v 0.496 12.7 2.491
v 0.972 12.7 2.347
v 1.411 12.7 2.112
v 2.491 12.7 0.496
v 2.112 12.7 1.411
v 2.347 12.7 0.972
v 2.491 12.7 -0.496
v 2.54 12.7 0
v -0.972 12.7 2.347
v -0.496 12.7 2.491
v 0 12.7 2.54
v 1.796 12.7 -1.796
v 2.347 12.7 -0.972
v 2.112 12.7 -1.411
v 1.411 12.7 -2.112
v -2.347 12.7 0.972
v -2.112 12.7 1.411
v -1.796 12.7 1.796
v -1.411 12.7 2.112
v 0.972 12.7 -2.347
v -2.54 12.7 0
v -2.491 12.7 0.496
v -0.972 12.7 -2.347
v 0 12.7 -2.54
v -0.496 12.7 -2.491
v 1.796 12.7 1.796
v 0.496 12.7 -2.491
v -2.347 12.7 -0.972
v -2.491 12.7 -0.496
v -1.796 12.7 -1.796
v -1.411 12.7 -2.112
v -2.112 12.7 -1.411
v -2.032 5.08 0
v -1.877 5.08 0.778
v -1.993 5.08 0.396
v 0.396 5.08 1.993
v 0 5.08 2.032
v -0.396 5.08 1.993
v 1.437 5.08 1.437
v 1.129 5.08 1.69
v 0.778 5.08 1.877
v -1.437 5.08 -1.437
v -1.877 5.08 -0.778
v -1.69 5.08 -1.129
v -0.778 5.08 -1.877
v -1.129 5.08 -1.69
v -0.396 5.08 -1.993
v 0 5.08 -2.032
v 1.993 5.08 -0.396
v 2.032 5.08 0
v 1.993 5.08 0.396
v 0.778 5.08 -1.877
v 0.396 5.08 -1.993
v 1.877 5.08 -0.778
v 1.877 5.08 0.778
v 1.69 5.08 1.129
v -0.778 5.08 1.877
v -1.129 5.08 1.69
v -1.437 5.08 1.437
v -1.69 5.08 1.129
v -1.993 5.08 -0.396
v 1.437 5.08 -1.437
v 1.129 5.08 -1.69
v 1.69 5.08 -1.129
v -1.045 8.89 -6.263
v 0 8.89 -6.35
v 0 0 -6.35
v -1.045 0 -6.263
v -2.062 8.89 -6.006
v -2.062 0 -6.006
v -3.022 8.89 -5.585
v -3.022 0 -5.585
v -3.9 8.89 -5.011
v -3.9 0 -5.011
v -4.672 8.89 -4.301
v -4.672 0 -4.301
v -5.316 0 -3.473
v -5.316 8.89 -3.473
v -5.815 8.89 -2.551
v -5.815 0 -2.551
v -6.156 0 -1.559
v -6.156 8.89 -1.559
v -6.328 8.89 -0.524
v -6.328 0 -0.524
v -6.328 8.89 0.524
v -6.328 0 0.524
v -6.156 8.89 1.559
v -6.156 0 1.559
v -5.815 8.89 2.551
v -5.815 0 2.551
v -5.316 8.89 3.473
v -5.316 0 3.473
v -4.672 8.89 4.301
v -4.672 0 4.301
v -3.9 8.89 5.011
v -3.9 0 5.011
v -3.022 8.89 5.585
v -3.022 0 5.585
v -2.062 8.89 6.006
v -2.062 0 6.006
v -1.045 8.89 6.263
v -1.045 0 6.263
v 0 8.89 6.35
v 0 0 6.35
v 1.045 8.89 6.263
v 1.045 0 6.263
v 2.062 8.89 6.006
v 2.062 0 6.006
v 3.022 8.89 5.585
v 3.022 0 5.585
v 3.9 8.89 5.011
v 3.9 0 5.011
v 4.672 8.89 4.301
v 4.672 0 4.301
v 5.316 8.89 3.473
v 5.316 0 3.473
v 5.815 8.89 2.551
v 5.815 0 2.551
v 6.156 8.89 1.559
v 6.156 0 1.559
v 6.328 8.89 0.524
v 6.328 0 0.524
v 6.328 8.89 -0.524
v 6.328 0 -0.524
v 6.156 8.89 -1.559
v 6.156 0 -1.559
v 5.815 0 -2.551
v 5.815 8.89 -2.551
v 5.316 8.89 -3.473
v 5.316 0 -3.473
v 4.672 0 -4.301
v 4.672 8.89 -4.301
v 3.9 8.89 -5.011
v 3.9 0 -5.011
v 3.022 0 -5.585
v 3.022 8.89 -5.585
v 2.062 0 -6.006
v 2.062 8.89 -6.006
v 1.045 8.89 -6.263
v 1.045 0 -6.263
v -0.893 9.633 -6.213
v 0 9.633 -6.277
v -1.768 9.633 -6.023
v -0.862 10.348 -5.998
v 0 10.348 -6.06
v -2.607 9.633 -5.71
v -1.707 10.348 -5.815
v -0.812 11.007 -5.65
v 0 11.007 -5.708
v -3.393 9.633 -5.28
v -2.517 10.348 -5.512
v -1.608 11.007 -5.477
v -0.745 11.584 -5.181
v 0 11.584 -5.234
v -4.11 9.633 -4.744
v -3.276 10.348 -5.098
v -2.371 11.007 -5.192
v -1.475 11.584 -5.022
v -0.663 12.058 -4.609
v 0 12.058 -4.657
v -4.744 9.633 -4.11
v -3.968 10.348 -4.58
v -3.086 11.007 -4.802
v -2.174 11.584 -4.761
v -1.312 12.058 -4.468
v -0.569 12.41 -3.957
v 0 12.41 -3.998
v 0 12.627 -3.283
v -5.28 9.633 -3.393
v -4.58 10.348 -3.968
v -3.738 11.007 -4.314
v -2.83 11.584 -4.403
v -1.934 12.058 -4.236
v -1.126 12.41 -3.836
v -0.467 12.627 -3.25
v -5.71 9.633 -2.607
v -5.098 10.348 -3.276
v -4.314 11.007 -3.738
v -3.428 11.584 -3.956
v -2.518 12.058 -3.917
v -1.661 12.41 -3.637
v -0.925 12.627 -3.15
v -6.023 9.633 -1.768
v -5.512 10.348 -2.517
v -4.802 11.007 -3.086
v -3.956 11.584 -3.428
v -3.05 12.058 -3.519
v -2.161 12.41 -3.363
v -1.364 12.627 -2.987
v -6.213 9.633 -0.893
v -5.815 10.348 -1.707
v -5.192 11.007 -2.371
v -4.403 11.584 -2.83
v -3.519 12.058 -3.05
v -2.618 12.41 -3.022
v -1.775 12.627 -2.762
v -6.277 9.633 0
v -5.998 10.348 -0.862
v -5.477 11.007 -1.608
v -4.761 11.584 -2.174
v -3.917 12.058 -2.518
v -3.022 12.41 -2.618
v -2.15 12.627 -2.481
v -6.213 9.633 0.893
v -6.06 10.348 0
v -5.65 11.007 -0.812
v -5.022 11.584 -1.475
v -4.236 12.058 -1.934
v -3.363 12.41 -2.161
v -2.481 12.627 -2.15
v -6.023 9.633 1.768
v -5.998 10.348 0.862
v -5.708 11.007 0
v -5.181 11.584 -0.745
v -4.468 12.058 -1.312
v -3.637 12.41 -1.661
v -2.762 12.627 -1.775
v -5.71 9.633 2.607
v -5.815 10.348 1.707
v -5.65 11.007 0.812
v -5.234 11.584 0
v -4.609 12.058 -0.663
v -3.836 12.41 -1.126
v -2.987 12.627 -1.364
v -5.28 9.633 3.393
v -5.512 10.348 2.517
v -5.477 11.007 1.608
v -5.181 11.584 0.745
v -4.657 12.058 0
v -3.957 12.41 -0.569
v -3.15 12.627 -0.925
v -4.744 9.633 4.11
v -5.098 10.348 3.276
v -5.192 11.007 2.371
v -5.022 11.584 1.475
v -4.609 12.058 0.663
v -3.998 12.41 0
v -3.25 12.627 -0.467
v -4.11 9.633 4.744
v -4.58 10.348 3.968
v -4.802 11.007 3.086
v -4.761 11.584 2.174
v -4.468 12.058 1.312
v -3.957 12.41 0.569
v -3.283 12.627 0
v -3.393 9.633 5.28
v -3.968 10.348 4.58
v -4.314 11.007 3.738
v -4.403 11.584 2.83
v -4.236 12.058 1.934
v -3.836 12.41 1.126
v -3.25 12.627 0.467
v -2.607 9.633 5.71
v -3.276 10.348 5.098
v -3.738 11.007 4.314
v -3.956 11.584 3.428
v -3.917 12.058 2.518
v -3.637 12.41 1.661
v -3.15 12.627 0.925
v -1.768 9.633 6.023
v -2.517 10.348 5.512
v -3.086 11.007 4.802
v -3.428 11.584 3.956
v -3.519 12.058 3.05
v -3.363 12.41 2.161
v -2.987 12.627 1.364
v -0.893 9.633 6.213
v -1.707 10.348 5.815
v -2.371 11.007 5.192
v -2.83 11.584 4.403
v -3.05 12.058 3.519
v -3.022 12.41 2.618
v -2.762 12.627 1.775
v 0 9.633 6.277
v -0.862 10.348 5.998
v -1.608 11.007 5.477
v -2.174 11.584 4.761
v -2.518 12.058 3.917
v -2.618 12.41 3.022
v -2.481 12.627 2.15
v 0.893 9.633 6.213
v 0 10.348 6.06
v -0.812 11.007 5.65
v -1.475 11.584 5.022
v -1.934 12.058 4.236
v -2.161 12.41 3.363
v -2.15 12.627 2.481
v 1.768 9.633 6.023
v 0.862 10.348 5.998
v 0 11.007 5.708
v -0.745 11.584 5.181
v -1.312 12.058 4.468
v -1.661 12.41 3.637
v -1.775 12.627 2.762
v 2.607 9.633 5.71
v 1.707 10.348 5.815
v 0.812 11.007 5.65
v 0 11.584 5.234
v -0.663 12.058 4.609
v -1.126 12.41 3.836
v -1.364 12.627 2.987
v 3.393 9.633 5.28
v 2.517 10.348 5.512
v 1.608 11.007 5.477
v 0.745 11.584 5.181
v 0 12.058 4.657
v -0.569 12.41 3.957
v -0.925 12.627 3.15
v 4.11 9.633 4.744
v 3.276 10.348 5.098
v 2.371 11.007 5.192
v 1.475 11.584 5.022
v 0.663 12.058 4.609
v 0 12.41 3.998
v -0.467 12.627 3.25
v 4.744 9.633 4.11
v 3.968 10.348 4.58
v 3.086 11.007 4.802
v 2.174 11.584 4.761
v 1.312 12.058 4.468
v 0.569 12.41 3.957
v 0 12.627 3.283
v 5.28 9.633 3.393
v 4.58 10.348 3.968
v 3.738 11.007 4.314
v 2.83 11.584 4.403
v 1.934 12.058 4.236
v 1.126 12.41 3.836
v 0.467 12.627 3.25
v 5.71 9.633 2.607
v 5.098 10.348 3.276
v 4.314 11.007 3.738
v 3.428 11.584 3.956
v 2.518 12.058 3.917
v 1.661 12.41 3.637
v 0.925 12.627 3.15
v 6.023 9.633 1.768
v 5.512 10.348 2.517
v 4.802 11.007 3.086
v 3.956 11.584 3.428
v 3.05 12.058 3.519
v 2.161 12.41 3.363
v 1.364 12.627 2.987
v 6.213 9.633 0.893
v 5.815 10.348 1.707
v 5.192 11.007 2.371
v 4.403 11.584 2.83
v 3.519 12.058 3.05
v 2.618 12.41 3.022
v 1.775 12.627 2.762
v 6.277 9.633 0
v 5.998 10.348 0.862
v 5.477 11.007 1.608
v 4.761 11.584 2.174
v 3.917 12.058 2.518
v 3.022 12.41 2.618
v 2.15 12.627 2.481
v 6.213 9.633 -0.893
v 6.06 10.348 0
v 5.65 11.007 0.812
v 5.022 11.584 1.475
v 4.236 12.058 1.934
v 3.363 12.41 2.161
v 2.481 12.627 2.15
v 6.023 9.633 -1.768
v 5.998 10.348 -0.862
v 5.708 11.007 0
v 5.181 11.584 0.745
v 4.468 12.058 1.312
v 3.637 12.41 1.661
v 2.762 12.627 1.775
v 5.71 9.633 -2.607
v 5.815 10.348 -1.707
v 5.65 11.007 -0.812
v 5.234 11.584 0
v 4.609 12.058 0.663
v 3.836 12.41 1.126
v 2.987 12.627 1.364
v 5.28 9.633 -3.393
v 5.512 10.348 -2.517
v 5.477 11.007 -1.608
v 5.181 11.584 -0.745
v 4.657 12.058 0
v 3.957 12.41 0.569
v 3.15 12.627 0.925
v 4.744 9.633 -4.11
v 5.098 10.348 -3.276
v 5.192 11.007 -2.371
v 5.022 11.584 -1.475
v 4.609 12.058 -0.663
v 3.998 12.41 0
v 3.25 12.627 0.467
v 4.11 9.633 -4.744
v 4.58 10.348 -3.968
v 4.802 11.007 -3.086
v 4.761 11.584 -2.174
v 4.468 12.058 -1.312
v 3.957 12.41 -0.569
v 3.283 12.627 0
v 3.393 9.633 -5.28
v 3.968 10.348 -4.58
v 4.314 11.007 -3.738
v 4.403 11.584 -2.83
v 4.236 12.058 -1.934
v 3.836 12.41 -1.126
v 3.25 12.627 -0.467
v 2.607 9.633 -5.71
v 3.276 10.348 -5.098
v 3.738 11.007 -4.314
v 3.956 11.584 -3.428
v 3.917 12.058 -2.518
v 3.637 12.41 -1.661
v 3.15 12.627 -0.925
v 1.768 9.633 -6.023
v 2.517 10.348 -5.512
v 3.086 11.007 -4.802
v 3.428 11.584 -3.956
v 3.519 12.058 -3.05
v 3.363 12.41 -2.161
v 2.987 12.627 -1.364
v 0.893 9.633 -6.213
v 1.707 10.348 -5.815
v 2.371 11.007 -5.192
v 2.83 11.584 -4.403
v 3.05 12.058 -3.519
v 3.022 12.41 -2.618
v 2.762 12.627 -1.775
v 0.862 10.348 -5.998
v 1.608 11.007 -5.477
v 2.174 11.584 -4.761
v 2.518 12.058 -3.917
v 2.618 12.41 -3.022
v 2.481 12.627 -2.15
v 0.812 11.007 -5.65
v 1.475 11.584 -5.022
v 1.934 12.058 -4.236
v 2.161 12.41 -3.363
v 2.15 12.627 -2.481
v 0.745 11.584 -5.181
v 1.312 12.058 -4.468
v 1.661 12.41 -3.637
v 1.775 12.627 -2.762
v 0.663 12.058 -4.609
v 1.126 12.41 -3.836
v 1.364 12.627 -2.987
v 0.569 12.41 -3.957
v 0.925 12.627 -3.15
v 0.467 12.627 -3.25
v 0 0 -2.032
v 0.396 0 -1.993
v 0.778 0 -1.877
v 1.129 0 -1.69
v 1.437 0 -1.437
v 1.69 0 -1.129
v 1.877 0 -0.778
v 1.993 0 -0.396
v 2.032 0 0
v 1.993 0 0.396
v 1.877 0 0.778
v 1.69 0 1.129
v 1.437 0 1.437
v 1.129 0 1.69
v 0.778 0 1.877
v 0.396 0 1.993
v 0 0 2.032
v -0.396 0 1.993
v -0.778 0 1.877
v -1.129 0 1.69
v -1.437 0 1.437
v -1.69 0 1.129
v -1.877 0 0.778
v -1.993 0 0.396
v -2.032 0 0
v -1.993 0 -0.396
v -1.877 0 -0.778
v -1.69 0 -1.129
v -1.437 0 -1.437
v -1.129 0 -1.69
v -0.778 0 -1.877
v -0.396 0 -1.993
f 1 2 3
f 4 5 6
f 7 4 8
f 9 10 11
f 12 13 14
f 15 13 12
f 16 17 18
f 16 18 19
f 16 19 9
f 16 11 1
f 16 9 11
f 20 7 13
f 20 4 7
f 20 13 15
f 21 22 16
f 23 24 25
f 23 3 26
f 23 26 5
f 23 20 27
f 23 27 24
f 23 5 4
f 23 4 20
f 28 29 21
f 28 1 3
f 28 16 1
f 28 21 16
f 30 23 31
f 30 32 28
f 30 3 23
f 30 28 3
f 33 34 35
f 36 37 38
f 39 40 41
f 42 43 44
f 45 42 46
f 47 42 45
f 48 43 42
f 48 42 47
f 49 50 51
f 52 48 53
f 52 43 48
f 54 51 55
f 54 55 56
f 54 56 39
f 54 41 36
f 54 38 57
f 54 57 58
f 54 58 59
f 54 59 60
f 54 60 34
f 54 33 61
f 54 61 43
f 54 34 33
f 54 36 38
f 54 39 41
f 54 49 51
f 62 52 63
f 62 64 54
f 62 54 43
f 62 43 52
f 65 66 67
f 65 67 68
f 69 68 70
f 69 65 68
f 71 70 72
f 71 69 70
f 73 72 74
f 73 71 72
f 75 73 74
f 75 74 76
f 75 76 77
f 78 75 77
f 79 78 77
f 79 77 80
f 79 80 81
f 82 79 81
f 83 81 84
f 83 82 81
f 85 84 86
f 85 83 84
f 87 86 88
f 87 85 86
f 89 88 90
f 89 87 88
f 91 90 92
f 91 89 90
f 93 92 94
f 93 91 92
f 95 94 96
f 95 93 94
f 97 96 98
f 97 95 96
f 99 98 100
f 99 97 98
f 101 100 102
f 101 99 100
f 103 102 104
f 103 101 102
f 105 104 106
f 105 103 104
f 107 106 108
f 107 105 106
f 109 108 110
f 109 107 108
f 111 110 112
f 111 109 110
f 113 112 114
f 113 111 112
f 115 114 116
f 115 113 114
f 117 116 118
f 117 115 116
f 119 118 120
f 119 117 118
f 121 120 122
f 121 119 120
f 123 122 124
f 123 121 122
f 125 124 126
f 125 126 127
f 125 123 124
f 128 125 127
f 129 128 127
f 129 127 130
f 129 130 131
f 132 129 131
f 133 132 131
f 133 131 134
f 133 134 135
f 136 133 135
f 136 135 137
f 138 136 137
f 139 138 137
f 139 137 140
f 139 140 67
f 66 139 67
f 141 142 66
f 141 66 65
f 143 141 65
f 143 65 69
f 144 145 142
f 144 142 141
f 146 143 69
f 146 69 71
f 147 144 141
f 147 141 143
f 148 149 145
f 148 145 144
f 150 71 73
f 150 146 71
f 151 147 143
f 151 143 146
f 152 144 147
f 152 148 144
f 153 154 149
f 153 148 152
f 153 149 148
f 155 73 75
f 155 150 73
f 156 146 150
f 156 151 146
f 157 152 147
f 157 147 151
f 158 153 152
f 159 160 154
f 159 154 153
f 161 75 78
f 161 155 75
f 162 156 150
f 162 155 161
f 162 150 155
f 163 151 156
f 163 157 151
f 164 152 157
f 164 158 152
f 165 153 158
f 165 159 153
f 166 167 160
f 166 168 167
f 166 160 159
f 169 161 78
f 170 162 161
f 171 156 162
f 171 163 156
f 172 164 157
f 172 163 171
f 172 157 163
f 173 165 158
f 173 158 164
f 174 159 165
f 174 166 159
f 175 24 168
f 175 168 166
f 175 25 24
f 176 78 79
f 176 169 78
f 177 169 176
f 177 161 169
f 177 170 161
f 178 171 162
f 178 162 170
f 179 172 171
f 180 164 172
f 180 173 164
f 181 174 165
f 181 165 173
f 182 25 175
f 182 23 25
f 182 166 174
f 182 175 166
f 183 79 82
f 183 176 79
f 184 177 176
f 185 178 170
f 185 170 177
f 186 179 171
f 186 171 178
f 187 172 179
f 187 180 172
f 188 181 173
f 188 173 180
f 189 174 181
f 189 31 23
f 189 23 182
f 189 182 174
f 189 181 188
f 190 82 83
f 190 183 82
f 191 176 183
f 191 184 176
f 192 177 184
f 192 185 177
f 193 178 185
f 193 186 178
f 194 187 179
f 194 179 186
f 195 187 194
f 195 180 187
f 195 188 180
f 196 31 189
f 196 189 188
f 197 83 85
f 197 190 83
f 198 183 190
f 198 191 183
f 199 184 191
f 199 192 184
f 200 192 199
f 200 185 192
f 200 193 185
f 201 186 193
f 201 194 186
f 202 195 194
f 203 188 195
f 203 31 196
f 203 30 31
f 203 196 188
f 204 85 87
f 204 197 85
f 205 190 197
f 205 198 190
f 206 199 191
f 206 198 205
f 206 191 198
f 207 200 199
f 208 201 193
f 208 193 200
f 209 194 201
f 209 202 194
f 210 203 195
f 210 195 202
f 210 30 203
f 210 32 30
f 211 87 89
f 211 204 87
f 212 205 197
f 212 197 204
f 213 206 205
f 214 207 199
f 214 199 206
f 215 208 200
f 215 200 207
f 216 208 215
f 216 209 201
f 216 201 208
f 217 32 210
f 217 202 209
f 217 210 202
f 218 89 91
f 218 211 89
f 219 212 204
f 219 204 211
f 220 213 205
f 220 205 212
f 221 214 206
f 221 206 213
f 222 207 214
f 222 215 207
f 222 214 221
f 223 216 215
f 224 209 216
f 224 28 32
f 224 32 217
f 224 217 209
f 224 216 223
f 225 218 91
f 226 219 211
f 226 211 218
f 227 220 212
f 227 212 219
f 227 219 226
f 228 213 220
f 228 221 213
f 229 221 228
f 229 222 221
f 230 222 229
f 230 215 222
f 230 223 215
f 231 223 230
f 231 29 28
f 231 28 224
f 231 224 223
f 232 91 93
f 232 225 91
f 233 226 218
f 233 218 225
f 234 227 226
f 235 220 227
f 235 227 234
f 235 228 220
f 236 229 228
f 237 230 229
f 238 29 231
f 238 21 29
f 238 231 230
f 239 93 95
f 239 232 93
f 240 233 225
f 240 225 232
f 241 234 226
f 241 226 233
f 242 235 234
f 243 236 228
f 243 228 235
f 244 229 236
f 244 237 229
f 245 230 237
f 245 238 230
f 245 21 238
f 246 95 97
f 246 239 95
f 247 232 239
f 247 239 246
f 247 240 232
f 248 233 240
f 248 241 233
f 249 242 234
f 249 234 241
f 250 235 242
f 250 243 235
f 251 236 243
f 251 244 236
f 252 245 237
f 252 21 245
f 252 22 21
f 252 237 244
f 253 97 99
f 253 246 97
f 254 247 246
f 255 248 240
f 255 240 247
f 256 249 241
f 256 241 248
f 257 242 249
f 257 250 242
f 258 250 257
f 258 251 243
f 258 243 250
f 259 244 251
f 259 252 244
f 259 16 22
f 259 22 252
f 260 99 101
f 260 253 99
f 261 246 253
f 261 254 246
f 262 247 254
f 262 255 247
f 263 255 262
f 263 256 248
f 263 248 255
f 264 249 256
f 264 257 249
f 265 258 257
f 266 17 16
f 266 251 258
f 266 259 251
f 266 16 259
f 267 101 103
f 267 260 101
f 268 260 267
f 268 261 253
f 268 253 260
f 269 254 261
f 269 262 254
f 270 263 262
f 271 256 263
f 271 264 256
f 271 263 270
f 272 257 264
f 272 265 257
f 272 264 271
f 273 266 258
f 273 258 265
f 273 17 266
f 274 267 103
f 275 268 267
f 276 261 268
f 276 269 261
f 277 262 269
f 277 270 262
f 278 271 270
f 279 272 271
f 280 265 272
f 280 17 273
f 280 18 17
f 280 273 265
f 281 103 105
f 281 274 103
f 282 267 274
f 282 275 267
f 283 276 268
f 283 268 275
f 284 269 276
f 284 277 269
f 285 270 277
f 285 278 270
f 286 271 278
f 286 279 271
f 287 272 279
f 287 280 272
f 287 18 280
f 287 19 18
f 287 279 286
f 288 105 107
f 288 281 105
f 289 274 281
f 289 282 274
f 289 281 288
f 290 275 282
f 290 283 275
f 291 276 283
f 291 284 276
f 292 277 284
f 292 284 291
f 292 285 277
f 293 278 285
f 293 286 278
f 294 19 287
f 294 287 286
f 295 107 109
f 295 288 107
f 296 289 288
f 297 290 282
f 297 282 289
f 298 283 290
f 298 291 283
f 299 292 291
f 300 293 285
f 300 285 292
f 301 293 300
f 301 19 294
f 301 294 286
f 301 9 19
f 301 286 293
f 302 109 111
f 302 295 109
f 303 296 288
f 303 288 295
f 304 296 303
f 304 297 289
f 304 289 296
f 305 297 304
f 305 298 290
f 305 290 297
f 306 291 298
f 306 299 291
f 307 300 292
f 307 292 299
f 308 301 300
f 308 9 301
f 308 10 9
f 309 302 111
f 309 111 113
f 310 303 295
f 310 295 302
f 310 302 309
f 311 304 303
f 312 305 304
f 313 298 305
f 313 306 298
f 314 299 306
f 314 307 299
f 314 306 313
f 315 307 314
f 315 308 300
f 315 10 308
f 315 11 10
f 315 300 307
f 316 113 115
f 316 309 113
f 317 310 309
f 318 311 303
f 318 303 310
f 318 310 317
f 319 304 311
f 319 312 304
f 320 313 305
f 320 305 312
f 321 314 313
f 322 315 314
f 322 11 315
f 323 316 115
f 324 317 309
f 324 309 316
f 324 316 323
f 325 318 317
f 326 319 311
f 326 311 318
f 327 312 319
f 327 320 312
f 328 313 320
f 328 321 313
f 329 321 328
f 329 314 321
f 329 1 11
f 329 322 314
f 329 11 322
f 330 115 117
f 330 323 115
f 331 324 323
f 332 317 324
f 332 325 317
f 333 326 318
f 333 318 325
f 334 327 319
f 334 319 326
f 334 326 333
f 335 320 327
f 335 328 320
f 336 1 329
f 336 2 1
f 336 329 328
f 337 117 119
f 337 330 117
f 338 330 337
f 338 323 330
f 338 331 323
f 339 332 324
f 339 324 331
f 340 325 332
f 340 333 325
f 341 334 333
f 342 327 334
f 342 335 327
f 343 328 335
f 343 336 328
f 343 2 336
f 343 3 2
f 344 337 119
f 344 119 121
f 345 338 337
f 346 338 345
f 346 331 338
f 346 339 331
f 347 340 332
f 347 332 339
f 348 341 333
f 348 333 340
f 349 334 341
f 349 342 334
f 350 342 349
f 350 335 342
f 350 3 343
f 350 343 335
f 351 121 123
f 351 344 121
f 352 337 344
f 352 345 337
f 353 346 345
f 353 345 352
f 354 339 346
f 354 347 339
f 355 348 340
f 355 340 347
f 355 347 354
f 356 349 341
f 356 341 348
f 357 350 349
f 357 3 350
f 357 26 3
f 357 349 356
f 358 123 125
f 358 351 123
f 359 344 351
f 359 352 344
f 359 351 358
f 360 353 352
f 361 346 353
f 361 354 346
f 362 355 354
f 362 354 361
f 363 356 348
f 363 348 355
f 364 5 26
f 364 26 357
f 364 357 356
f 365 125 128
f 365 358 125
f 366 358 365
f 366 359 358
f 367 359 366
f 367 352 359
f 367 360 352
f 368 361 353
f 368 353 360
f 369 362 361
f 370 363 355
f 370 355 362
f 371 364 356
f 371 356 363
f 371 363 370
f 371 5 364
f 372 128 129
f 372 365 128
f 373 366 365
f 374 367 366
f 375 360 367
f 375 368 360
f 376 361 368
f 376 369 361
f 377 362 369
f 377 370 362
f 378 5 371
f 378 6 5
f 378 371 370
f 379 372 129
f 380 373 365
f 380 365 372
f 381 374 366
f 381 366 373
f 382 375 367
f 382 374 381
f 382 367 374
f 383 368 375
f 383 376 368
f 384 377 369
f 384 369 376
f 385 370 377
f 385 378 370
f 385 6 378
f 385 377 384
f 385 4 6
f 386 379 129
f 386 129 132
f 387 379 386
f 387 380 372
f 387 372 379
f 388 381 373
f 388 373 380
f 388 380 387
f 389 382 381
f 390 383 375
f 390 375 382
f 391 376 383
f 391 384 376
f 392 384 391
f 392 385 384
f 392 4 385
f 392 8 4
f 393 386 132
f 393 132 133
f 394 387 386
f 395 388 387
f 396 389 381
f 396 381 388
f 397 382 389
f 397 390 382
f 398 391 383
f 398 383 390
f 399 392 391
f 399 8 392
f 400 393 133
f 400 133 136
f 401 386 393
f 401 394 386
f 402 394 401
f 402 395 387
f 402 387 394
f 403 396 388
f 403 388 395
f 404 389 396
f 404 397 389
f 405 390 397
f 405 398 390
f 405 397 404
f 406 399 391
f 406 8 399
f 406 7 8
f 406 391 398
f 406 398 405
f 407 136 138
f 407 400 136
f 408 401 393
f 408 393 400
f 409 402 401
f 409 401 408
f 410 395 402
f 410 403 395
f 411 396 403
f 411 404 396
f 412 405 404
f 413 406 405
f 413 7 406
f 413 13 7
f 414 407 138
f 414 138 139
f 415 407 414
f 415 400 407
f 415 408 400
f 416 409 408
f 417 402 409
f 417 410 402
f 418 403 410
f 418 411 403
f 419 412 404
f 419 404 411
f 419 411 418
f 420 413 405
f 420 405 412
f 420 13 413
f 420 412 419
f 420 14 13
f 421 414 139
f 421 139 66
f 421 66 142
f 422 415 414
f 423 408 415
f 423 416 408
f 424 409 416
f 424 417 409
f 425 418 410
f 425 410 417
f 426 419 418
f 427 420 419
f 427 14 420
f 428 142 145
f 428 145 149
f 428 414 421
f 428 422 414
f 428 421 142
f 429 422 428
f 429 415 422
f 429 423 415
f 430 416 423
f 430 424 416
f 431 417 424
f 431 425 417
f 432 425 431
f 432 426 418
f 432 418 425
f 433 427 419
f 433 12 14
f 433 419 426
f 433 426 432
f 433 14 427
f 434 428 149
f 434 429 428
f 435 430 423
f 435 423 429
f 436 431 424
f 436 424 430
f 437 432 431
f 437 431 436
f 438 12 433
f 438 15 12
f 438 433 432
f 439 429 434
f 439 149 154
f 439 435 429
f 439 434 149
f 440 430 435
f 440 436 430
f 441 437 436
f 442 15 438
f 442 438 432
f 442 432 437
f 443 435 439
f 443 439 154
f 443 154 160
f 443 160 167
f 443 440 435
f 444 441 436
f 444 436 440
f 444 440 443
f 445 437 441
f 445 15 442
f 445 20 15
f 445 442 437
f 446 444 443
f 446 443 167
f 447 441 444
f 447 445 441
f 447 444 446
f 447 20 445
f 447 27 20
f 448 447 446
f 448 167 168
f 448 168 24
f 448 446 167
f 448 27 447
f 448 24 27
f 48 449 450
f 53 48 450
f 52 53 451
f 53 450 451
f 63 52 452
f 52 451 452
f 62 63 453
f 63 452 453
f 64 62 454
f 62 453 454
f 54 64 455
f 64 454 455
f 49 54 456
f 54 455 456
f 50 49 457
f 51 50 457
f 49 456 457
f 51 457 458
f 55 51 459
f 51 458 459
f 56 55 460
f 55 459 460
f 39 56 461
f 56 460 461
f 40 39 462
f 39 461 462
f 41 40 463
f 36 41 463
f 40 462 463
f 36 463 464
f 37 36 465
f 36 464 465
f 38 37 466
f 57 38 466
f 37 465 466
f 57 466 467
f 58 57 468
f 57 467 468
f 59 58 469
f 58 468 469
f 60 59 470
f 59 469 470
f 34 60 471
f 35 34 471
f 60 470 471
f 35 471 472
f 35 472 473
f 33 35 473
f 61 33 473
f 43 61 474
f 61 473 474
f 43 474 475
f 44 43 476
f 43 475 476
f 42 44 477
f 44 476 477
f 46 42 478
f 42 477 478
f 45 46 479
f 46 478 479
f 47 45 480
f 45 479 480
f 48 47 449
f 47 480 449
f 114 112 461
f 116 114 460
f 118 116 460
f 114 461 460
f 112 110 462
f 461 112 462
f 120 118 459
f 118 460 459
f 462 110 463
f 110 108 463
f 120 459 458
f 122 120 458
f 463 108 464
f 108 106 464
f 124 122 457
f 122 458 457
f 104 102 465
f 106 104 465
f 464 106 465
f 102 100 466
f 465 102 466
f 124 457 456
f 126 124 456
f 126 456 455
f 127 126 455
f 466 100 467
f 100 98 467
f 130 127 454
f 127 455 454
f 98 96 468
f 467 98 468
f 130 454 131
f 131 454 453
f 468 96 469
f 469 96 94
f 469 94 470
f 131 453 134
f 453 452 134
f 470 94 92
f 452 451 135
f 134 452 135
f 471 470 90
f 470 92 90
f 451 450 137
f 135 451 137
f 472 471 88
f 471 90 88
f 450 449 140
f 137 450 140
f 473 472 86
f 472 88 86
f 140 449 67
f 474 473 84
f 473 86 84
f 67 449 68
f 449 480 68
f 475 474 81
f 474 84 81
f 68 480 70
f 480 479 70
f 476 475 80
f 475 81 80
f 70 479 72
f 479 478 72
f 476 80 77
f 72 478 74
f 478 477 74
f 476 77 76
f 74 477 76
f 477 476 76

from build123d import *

# Parameters (mm, degrees)
SKETCH1_W          = 6.35
SKETCH1_H          = 12.7
FILLET1_R          = 3.81
SKETCH2_R          = 2.032
CUT_EXTRUDE1_DEPTH = 5.08


with BuildPart() as part:
    # Sketch1 → Revolve3 (revolve)
    with BuildSketch(Plane.XY, mode=Mode.PRIVATE) as revolve3_sk:
        with Locations((-3.175, 6.35)):
            Rectangle(SKETCH1_W, SKETCH1_H)
    revolve(revolve3_sk.sketch.rotate(Axis((0, -6.586539343, 0), (0, 1, 0)), 270), axis=Axis((0, -6.586539343, 0), (0, 1, 0)))

    # Fillet1
    fillet1_edges = [part.edges().sort_by_distance(p)[0] for p in [
        (0, 12.7, 6.35),
    ]]
    fillet(fillet1_edges, radius=FILLET1_R)

    # Sketch2 → Cut-Extrude1 (cut)
    with BuildSketch(Plane(origin=(0, 0, 0), x_dir=(-1, 0, 0), z_dir=(0, -1, 0))):
        with Locations(Location((0, 0, 0), (0, 0, 90))):
            Circle(SKETCH2_R)
    extrude(amount=-CUT_EXTRUDE1_DEPTH, mode=Mode.SUBTRACT)


solid = part.part
